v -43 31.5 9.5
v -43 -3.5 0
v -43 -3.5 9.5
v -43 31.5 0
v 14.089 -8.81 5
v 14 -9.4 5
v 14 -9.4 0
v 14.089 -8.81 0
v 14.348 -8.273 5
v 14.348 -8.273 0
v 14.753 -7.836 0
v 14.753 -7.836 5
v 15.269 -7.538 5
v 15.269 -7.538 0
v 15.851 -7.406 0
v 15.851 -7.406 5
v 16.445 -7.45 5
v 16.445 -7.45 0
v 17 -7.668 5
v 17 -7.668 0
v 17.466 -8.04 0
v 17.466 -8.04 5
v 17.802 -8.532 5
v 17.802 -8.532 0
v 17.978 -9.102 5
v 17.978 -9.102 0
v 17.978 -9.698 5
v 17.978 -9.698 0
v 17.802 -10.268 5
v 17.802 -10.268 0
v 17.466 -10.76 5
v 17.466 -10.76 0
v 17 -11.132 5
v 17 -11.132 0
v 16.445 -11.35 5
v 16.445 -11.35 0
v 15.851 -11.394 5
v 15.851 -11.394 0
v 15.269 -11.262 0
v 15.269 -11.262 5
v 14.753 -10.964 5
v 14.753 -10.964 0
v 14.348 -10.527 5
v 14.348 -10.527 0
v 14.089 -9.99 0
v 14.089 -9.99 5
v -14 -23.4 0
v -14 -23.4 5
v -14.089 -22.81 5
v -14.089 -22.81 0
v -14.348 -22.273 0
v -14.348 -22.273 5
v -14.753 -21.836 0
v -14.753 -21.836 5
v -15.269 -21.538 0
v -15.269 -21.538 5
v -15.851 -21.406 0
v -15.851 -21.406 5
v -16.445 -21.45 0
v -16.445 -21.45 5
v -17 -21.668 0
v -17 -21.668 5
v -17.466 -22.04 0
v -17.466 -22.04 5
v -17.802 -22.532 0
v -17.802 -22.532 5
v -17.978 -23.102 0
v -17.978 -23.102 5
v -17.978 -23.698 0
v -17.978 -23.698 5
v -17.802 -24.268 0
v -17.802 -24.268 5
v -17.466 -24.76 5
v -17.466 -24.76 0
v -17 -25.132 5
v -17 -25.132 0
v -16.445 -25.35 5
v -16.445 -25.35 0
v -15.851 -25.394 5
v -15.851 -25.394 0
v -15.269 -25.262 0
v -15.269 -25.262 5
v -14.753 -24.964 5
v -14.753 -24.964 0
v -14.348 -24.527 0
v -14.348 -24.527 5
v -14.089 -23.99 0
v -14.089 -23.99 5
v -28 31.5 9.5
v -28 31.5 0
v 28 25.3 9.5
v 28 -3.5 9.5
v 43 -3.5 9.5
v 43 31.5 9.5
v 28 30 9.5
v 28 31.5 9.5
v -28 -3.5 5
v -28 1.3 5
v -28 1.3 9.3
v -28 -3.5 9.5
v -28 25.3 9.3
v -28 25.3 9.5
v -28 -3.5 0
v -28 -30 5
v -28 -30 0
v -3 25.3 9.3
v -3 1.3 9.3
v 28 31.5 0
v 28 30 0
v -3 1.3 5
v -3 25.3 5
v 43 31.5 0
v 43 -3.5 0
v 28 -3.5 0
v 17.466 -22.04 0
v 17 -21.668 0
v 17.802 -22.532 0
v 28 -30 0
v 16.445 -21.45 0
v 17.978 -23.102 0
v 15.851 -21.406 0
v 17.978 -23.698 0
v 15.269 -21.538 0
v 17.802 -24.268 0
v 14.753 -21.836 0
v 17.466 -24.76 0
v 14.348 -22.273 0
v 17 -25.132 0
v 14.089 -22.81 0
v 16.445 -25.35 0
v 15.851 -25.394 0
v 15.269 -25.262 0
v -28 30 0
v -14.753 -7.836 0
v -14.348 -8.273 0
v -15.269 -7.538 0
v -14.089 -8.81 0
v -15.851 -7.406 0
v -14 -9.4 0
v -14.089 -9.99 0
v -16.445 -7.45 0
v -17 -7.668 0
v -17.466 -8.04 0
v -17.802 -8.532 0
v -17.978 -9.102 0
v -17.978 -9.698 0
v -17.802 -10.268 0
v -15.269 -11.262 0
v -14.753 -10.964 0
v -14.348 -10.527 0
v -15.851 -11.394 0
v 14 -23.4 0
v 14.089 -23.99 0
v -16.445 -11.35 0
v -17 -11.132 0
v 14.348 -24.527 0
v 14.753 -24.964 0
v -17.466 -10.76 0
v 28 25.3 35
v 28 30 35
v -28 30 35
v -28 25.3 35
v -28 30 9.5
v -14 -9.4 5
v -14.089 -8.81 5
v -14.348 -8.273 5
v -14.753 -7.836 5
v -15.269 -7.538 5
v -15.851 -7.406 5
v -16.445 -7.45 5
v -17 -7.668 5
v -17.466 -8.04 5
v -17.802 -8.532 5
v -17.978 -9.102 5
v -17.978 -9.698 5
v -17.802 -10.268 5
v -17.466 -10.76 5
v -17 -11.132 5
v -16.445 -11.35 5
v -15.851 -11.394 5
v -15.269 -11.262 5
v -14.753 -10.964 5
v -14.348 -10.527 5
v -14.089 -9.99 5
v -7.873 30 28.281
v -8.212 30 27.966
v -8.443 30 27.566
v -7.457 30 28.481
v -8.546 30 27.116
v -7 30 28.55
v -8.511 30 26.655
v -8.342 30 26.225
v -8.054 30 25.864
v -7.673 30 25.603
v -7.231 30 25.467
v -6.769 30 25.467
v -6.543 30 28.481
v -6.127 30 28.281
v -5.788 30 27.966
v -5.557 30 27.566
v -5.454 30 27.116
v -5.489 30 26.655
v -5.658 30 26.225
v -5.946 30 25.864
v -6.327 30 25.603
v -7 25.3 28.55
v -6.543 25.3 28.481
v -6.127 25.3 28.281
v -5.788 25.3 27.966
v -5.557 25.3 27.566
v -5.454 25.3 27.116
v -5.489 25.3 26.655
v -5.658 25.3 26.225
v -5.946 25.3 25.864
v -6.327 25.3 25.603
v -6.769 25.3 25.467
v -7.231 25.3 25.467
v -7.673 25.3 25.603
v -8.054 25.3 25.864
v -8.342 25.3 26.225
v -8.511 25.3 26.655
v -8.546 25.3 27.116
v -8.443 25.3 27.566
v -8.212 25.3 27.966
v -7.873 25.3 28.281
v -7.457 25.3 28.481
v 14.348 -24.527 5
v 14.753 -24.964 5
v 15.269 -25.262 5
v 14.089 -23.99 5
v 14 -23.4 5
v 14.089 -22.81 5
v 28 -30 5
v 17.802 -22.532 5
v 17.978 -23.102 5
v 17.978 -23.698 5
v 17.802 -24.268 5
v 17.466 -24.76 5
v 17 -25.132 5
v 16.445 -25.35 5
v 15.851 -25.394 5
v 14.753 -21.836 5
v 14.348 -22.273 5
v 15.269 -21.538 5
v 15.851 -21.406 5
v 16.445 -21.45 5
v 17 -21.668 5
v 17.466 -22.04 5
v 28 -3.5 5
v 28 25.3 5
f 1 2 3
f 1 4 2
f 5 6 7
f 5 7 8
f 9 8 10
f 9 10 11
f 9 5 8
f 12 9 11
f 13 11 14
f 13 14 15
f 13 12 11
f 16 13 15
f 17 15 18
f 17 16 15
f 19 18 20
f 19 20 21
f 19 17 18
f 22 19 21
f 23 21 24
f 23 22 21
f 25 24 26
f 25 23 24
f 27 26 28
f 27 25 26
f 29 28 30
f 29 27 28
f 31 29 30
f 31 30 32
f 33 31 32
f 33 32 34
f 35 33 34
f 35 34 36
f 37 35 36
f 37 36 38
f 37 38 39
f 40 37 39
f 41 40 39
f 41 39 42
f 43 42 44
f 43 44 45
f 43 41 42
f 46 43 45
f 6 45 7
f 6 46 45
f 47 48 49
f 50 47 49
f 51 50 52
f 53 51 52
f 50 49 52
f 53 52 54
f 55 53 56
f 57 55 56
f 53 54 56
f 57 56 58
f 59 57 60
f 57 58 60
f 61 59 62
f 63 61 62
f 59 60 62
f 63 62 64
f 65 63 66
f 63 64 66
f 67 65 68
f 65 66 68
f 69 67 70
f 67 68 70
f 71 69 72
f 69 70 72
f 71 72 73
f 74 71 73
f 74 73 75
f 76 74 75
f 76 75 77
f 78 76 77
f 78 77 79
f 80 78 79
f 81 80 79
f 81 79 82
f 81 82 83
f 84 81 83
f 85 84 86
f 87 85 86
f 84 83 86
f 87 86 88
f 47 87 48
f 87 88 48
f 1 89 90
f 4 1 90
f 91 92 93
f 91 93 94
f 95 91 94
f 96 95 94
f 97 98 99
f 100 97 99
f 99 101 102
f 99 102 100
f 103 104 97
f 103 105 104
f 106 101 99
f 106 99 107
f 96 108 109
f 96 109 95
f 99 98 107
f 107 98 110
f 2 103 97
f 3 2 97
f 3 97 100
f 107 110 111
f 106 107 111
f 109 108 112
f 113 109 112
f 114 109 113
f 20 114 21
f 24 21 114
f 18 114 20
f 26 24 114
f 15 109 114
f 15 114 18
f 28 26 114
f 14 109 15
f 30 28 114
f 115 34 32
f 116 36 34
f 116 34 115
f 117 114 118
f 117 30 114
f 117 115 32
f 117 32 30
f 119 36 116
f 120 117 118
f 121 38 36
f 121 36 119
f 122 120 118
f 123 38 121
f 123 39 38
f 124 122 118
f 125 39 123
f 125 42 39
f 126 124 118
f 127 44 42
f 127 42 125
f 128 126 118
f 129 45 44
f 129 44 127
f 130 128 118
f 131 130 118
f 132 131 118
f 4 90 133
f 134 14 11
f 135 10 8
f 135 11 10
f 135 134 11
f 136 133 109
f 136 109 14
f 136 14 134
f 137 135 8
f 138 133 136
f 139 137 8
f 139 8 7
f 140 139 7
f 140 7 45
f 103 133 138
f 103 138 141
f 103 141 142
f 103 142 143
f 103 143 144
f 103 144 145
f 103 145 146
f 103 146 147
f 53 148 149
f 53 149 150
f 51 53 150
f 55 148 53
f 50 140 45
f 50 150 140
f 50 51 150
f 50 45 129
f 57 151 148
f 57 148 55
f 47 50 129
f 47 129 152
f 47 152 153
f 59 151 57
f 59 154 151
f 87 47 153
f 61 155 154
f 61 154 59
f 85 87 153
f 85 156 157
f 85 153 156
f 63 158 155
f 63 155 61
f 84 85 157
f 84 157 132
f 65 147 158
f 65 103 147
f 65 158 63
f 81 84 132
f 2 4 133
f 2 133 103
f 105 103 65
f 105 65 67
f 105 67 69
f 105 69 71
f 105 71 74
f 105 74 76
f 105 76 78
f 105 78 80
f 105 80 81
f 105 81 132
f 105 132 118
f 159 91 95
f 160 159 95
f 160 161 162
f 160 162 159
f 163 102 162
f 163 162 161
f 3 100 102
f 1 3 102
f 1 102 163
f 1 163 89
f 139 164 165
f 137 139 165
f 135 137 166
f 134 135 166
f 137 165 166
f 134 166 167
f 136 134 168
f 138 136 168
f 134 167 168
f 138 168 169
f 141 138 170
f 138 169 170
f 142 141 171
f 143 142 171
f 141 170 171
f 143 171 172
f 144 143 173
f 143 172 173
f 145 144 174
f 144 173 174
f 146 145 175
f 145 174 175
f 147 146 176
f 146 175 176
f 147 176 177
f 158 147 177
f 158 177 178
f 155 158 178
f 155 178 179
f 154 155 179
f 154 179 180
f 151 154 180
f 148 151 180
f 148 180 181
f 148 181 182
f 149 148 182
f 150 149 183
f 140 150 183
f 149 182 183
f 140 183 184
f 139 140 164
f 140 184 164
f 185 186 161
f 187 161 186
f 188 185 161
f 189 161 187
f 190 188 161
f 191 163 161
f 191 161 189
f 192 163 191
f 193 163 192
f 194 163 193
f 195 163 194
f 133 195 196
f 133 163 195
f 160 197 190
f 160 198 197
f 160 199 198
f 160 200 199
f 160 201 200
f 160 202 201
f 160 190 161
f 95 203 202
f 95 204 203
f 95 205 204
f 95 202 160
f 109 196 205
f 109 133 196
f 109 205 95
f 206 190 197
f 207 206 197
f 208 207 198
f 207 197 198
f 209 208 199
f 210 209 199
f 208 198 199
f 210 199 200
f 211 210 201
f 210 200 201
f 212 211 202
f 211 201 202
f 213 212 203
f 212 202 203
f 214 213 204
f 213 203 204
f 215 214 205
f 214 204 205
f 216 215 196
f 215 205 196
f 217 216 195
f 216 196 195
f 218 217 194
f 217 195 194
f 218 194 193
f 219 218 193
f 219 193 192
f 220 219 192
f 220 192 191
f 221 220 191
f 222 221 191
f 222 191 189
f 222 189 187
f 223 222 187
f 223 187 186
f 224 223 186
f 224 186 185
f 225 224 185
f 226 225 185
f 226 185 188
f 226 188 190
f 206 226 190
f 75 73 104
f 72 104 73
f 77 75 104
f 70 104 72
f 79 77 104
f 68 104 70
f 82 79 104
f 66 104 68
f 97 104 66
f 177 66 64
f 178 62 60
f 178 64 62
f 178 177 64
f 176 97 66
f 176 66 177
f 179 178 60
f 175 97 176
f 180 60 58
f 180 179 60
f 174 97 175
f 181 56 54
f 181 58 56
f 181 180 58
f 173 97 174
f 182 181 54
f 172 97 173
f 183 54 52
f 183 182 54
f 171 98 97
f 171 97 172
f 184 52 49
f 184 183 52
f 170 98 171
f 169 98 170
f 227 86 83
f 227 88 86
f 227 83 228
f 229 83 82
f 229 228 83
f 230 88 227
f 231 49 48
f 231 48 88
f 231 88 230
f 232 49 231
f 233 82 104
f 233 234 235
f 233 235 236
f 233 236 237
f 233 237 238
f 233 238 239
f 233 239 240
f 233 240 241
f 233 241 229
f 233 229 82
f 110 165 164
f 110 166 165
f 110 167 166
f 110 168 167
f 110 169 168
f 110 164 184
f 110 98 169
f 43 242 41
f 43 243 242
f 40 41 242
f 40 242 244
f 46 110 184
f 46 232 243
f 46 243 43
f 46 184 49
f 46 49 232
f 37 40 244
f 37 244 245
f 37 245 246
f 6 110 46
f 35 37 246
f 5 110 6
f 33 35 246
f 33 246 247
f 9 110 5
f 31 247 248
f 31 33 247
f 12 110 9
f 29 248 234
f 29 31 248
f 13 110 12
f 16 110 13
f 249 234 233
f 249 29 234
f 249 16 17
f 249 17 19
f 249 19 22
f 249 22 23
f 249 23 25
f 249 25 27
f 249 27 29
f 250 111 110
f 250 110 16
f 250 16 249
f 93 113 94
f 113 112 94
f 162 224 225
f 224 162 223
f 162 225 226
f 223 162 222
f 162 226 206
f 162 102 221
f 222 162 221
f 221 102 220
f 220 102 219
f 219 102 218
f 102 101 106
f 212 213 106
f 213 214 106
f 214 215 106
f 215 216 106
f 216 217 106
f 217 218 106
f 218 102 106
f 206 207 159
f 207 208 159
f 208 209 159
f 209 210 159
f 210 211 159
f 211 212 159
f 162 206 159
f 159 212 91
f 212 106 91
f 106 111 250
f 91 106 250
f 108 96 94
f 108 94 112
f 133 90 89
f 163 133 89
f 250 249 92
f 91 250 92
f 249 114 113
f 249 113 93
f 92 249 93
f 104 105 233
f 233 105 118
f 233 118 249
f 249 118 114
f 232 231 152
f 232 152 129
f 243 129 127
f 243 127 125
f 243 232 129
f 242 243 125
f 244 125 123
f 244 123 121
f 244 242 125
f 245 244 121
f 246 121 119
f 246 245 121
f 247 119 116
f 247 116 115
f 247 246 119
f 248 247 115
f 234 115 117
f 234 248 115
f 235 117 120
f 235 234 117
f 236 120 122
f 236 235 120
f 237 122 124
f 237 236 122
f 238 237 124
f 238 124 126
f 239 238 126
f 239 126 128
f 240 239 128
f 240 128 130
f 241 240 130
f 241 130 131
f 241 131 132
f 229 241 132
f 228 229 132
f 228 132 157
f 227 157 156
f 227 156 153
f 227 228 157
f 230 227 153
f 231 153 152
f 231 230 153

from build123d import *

# Parameters (mm, degrees)
SKETCH_1_W          = 56
SKETCH_1_H          = 60
EXTRUDE_1_DEPTH     = 5
SKETCH_2_R          = 2
CUT_EXTRUDE_1_DEPTH = 5
SKETCH_3_W          = 56
SKETCH_3_H          = 4.7
EXTRUDE_2_DEPTH     = 30
SKETCH_4_R          = 1.55
CUT_EXTRUDE_2_DEPTH = 40
SKETCH_5_W          = 25
SKETCH_5_H          = 24
EXTRUDE_3_DEPTH     = 4.3
EXTRUDE_4_DEPTH     = 15


with BuildPart() as part:
    # 草图1 → 凸台-拉伸1 (new body)
    with BuildSketch(Plane.XY):
        Rectangle(SKETCH_1_W, SKETCH_1_H)
    extrude(amount=EXTRUDE_1_DEPTH)

    # 草图2 → 切除-拉伸1 (cut)
    with BuildSketch(Plane.XY.offset(5)):
        with Locations((-16, -23.4)):
            Circle(SKETCH_2_R)
        with Locations((-16, -9.4)):
            Circle(SKETCH_2_R)
    cut_extrude_1 = extrude(amount=-CUT_EXTRUDE_1_DEPTH, mode=Mode.SUBTRACT)

    # 镜向1: 切除-拉伸1 across plane
    add(cut_extrude_1.mirror(Plane(origin=(0, 0, 0), x_dir=(0, 0, 1), z_dir=(1, 0, 0))), mode=Mode.SUBTRACT)

    # 草图3 → 凸台-拉伸2 (add)
    with BuildSketch(Plane.XY.offset(5)):
        with Locations((0, 27.65)):
            Rectangle(SKETCH_3_W, SKETCH_3_H)
    extrude(amount=EXTRUDE_2_DEPTH)

    # 草图4 → 切除-拉伸2 (cut)
    with BuildSketch(Plane(origin=(0, 30, 0), x_dir=(1, 0, 0), z_dir=(0, 1, 0))):
        with Locations(Location((-7, -27, 0), (0, 0, 270))):
            Circle(SKETCH_4_R)
    extrude(amount=-CUT_EXTRUDE_2_DEPTH, mode=Mode.SUBTRACT)

    # 草图5 → 凸台-拉伸3 (add)
    with BuildSketch(Plane.XY.offset(5)):
        with Locations((-15.5, 13.3)):
            Rectangle(SKETCH_5_W, SKETCH_5_H)
    extrude(amount=EXTRUDE_3_DEPTH)

    # 草图6 → 凸台-拉伸4 (add)
    with BuildSketch(Plane.ZY.offset(28)):
        Polygon((0, 26.5), (0, -3.5), (9.5, -3.5), (9.5, 31.5), (0, 31.5), align=None)
    extrude_4 = extrude(amount=EXTRUDE_4_DEPTH)

    # 镜向2: 凸台-拉伸4 across plane
    add(extrude_4.mirror(Plane(origin=(0, 0, 0), x_dir=(0, 0, 1), z_dir=(1, 0, 0))))


solid = part.part
